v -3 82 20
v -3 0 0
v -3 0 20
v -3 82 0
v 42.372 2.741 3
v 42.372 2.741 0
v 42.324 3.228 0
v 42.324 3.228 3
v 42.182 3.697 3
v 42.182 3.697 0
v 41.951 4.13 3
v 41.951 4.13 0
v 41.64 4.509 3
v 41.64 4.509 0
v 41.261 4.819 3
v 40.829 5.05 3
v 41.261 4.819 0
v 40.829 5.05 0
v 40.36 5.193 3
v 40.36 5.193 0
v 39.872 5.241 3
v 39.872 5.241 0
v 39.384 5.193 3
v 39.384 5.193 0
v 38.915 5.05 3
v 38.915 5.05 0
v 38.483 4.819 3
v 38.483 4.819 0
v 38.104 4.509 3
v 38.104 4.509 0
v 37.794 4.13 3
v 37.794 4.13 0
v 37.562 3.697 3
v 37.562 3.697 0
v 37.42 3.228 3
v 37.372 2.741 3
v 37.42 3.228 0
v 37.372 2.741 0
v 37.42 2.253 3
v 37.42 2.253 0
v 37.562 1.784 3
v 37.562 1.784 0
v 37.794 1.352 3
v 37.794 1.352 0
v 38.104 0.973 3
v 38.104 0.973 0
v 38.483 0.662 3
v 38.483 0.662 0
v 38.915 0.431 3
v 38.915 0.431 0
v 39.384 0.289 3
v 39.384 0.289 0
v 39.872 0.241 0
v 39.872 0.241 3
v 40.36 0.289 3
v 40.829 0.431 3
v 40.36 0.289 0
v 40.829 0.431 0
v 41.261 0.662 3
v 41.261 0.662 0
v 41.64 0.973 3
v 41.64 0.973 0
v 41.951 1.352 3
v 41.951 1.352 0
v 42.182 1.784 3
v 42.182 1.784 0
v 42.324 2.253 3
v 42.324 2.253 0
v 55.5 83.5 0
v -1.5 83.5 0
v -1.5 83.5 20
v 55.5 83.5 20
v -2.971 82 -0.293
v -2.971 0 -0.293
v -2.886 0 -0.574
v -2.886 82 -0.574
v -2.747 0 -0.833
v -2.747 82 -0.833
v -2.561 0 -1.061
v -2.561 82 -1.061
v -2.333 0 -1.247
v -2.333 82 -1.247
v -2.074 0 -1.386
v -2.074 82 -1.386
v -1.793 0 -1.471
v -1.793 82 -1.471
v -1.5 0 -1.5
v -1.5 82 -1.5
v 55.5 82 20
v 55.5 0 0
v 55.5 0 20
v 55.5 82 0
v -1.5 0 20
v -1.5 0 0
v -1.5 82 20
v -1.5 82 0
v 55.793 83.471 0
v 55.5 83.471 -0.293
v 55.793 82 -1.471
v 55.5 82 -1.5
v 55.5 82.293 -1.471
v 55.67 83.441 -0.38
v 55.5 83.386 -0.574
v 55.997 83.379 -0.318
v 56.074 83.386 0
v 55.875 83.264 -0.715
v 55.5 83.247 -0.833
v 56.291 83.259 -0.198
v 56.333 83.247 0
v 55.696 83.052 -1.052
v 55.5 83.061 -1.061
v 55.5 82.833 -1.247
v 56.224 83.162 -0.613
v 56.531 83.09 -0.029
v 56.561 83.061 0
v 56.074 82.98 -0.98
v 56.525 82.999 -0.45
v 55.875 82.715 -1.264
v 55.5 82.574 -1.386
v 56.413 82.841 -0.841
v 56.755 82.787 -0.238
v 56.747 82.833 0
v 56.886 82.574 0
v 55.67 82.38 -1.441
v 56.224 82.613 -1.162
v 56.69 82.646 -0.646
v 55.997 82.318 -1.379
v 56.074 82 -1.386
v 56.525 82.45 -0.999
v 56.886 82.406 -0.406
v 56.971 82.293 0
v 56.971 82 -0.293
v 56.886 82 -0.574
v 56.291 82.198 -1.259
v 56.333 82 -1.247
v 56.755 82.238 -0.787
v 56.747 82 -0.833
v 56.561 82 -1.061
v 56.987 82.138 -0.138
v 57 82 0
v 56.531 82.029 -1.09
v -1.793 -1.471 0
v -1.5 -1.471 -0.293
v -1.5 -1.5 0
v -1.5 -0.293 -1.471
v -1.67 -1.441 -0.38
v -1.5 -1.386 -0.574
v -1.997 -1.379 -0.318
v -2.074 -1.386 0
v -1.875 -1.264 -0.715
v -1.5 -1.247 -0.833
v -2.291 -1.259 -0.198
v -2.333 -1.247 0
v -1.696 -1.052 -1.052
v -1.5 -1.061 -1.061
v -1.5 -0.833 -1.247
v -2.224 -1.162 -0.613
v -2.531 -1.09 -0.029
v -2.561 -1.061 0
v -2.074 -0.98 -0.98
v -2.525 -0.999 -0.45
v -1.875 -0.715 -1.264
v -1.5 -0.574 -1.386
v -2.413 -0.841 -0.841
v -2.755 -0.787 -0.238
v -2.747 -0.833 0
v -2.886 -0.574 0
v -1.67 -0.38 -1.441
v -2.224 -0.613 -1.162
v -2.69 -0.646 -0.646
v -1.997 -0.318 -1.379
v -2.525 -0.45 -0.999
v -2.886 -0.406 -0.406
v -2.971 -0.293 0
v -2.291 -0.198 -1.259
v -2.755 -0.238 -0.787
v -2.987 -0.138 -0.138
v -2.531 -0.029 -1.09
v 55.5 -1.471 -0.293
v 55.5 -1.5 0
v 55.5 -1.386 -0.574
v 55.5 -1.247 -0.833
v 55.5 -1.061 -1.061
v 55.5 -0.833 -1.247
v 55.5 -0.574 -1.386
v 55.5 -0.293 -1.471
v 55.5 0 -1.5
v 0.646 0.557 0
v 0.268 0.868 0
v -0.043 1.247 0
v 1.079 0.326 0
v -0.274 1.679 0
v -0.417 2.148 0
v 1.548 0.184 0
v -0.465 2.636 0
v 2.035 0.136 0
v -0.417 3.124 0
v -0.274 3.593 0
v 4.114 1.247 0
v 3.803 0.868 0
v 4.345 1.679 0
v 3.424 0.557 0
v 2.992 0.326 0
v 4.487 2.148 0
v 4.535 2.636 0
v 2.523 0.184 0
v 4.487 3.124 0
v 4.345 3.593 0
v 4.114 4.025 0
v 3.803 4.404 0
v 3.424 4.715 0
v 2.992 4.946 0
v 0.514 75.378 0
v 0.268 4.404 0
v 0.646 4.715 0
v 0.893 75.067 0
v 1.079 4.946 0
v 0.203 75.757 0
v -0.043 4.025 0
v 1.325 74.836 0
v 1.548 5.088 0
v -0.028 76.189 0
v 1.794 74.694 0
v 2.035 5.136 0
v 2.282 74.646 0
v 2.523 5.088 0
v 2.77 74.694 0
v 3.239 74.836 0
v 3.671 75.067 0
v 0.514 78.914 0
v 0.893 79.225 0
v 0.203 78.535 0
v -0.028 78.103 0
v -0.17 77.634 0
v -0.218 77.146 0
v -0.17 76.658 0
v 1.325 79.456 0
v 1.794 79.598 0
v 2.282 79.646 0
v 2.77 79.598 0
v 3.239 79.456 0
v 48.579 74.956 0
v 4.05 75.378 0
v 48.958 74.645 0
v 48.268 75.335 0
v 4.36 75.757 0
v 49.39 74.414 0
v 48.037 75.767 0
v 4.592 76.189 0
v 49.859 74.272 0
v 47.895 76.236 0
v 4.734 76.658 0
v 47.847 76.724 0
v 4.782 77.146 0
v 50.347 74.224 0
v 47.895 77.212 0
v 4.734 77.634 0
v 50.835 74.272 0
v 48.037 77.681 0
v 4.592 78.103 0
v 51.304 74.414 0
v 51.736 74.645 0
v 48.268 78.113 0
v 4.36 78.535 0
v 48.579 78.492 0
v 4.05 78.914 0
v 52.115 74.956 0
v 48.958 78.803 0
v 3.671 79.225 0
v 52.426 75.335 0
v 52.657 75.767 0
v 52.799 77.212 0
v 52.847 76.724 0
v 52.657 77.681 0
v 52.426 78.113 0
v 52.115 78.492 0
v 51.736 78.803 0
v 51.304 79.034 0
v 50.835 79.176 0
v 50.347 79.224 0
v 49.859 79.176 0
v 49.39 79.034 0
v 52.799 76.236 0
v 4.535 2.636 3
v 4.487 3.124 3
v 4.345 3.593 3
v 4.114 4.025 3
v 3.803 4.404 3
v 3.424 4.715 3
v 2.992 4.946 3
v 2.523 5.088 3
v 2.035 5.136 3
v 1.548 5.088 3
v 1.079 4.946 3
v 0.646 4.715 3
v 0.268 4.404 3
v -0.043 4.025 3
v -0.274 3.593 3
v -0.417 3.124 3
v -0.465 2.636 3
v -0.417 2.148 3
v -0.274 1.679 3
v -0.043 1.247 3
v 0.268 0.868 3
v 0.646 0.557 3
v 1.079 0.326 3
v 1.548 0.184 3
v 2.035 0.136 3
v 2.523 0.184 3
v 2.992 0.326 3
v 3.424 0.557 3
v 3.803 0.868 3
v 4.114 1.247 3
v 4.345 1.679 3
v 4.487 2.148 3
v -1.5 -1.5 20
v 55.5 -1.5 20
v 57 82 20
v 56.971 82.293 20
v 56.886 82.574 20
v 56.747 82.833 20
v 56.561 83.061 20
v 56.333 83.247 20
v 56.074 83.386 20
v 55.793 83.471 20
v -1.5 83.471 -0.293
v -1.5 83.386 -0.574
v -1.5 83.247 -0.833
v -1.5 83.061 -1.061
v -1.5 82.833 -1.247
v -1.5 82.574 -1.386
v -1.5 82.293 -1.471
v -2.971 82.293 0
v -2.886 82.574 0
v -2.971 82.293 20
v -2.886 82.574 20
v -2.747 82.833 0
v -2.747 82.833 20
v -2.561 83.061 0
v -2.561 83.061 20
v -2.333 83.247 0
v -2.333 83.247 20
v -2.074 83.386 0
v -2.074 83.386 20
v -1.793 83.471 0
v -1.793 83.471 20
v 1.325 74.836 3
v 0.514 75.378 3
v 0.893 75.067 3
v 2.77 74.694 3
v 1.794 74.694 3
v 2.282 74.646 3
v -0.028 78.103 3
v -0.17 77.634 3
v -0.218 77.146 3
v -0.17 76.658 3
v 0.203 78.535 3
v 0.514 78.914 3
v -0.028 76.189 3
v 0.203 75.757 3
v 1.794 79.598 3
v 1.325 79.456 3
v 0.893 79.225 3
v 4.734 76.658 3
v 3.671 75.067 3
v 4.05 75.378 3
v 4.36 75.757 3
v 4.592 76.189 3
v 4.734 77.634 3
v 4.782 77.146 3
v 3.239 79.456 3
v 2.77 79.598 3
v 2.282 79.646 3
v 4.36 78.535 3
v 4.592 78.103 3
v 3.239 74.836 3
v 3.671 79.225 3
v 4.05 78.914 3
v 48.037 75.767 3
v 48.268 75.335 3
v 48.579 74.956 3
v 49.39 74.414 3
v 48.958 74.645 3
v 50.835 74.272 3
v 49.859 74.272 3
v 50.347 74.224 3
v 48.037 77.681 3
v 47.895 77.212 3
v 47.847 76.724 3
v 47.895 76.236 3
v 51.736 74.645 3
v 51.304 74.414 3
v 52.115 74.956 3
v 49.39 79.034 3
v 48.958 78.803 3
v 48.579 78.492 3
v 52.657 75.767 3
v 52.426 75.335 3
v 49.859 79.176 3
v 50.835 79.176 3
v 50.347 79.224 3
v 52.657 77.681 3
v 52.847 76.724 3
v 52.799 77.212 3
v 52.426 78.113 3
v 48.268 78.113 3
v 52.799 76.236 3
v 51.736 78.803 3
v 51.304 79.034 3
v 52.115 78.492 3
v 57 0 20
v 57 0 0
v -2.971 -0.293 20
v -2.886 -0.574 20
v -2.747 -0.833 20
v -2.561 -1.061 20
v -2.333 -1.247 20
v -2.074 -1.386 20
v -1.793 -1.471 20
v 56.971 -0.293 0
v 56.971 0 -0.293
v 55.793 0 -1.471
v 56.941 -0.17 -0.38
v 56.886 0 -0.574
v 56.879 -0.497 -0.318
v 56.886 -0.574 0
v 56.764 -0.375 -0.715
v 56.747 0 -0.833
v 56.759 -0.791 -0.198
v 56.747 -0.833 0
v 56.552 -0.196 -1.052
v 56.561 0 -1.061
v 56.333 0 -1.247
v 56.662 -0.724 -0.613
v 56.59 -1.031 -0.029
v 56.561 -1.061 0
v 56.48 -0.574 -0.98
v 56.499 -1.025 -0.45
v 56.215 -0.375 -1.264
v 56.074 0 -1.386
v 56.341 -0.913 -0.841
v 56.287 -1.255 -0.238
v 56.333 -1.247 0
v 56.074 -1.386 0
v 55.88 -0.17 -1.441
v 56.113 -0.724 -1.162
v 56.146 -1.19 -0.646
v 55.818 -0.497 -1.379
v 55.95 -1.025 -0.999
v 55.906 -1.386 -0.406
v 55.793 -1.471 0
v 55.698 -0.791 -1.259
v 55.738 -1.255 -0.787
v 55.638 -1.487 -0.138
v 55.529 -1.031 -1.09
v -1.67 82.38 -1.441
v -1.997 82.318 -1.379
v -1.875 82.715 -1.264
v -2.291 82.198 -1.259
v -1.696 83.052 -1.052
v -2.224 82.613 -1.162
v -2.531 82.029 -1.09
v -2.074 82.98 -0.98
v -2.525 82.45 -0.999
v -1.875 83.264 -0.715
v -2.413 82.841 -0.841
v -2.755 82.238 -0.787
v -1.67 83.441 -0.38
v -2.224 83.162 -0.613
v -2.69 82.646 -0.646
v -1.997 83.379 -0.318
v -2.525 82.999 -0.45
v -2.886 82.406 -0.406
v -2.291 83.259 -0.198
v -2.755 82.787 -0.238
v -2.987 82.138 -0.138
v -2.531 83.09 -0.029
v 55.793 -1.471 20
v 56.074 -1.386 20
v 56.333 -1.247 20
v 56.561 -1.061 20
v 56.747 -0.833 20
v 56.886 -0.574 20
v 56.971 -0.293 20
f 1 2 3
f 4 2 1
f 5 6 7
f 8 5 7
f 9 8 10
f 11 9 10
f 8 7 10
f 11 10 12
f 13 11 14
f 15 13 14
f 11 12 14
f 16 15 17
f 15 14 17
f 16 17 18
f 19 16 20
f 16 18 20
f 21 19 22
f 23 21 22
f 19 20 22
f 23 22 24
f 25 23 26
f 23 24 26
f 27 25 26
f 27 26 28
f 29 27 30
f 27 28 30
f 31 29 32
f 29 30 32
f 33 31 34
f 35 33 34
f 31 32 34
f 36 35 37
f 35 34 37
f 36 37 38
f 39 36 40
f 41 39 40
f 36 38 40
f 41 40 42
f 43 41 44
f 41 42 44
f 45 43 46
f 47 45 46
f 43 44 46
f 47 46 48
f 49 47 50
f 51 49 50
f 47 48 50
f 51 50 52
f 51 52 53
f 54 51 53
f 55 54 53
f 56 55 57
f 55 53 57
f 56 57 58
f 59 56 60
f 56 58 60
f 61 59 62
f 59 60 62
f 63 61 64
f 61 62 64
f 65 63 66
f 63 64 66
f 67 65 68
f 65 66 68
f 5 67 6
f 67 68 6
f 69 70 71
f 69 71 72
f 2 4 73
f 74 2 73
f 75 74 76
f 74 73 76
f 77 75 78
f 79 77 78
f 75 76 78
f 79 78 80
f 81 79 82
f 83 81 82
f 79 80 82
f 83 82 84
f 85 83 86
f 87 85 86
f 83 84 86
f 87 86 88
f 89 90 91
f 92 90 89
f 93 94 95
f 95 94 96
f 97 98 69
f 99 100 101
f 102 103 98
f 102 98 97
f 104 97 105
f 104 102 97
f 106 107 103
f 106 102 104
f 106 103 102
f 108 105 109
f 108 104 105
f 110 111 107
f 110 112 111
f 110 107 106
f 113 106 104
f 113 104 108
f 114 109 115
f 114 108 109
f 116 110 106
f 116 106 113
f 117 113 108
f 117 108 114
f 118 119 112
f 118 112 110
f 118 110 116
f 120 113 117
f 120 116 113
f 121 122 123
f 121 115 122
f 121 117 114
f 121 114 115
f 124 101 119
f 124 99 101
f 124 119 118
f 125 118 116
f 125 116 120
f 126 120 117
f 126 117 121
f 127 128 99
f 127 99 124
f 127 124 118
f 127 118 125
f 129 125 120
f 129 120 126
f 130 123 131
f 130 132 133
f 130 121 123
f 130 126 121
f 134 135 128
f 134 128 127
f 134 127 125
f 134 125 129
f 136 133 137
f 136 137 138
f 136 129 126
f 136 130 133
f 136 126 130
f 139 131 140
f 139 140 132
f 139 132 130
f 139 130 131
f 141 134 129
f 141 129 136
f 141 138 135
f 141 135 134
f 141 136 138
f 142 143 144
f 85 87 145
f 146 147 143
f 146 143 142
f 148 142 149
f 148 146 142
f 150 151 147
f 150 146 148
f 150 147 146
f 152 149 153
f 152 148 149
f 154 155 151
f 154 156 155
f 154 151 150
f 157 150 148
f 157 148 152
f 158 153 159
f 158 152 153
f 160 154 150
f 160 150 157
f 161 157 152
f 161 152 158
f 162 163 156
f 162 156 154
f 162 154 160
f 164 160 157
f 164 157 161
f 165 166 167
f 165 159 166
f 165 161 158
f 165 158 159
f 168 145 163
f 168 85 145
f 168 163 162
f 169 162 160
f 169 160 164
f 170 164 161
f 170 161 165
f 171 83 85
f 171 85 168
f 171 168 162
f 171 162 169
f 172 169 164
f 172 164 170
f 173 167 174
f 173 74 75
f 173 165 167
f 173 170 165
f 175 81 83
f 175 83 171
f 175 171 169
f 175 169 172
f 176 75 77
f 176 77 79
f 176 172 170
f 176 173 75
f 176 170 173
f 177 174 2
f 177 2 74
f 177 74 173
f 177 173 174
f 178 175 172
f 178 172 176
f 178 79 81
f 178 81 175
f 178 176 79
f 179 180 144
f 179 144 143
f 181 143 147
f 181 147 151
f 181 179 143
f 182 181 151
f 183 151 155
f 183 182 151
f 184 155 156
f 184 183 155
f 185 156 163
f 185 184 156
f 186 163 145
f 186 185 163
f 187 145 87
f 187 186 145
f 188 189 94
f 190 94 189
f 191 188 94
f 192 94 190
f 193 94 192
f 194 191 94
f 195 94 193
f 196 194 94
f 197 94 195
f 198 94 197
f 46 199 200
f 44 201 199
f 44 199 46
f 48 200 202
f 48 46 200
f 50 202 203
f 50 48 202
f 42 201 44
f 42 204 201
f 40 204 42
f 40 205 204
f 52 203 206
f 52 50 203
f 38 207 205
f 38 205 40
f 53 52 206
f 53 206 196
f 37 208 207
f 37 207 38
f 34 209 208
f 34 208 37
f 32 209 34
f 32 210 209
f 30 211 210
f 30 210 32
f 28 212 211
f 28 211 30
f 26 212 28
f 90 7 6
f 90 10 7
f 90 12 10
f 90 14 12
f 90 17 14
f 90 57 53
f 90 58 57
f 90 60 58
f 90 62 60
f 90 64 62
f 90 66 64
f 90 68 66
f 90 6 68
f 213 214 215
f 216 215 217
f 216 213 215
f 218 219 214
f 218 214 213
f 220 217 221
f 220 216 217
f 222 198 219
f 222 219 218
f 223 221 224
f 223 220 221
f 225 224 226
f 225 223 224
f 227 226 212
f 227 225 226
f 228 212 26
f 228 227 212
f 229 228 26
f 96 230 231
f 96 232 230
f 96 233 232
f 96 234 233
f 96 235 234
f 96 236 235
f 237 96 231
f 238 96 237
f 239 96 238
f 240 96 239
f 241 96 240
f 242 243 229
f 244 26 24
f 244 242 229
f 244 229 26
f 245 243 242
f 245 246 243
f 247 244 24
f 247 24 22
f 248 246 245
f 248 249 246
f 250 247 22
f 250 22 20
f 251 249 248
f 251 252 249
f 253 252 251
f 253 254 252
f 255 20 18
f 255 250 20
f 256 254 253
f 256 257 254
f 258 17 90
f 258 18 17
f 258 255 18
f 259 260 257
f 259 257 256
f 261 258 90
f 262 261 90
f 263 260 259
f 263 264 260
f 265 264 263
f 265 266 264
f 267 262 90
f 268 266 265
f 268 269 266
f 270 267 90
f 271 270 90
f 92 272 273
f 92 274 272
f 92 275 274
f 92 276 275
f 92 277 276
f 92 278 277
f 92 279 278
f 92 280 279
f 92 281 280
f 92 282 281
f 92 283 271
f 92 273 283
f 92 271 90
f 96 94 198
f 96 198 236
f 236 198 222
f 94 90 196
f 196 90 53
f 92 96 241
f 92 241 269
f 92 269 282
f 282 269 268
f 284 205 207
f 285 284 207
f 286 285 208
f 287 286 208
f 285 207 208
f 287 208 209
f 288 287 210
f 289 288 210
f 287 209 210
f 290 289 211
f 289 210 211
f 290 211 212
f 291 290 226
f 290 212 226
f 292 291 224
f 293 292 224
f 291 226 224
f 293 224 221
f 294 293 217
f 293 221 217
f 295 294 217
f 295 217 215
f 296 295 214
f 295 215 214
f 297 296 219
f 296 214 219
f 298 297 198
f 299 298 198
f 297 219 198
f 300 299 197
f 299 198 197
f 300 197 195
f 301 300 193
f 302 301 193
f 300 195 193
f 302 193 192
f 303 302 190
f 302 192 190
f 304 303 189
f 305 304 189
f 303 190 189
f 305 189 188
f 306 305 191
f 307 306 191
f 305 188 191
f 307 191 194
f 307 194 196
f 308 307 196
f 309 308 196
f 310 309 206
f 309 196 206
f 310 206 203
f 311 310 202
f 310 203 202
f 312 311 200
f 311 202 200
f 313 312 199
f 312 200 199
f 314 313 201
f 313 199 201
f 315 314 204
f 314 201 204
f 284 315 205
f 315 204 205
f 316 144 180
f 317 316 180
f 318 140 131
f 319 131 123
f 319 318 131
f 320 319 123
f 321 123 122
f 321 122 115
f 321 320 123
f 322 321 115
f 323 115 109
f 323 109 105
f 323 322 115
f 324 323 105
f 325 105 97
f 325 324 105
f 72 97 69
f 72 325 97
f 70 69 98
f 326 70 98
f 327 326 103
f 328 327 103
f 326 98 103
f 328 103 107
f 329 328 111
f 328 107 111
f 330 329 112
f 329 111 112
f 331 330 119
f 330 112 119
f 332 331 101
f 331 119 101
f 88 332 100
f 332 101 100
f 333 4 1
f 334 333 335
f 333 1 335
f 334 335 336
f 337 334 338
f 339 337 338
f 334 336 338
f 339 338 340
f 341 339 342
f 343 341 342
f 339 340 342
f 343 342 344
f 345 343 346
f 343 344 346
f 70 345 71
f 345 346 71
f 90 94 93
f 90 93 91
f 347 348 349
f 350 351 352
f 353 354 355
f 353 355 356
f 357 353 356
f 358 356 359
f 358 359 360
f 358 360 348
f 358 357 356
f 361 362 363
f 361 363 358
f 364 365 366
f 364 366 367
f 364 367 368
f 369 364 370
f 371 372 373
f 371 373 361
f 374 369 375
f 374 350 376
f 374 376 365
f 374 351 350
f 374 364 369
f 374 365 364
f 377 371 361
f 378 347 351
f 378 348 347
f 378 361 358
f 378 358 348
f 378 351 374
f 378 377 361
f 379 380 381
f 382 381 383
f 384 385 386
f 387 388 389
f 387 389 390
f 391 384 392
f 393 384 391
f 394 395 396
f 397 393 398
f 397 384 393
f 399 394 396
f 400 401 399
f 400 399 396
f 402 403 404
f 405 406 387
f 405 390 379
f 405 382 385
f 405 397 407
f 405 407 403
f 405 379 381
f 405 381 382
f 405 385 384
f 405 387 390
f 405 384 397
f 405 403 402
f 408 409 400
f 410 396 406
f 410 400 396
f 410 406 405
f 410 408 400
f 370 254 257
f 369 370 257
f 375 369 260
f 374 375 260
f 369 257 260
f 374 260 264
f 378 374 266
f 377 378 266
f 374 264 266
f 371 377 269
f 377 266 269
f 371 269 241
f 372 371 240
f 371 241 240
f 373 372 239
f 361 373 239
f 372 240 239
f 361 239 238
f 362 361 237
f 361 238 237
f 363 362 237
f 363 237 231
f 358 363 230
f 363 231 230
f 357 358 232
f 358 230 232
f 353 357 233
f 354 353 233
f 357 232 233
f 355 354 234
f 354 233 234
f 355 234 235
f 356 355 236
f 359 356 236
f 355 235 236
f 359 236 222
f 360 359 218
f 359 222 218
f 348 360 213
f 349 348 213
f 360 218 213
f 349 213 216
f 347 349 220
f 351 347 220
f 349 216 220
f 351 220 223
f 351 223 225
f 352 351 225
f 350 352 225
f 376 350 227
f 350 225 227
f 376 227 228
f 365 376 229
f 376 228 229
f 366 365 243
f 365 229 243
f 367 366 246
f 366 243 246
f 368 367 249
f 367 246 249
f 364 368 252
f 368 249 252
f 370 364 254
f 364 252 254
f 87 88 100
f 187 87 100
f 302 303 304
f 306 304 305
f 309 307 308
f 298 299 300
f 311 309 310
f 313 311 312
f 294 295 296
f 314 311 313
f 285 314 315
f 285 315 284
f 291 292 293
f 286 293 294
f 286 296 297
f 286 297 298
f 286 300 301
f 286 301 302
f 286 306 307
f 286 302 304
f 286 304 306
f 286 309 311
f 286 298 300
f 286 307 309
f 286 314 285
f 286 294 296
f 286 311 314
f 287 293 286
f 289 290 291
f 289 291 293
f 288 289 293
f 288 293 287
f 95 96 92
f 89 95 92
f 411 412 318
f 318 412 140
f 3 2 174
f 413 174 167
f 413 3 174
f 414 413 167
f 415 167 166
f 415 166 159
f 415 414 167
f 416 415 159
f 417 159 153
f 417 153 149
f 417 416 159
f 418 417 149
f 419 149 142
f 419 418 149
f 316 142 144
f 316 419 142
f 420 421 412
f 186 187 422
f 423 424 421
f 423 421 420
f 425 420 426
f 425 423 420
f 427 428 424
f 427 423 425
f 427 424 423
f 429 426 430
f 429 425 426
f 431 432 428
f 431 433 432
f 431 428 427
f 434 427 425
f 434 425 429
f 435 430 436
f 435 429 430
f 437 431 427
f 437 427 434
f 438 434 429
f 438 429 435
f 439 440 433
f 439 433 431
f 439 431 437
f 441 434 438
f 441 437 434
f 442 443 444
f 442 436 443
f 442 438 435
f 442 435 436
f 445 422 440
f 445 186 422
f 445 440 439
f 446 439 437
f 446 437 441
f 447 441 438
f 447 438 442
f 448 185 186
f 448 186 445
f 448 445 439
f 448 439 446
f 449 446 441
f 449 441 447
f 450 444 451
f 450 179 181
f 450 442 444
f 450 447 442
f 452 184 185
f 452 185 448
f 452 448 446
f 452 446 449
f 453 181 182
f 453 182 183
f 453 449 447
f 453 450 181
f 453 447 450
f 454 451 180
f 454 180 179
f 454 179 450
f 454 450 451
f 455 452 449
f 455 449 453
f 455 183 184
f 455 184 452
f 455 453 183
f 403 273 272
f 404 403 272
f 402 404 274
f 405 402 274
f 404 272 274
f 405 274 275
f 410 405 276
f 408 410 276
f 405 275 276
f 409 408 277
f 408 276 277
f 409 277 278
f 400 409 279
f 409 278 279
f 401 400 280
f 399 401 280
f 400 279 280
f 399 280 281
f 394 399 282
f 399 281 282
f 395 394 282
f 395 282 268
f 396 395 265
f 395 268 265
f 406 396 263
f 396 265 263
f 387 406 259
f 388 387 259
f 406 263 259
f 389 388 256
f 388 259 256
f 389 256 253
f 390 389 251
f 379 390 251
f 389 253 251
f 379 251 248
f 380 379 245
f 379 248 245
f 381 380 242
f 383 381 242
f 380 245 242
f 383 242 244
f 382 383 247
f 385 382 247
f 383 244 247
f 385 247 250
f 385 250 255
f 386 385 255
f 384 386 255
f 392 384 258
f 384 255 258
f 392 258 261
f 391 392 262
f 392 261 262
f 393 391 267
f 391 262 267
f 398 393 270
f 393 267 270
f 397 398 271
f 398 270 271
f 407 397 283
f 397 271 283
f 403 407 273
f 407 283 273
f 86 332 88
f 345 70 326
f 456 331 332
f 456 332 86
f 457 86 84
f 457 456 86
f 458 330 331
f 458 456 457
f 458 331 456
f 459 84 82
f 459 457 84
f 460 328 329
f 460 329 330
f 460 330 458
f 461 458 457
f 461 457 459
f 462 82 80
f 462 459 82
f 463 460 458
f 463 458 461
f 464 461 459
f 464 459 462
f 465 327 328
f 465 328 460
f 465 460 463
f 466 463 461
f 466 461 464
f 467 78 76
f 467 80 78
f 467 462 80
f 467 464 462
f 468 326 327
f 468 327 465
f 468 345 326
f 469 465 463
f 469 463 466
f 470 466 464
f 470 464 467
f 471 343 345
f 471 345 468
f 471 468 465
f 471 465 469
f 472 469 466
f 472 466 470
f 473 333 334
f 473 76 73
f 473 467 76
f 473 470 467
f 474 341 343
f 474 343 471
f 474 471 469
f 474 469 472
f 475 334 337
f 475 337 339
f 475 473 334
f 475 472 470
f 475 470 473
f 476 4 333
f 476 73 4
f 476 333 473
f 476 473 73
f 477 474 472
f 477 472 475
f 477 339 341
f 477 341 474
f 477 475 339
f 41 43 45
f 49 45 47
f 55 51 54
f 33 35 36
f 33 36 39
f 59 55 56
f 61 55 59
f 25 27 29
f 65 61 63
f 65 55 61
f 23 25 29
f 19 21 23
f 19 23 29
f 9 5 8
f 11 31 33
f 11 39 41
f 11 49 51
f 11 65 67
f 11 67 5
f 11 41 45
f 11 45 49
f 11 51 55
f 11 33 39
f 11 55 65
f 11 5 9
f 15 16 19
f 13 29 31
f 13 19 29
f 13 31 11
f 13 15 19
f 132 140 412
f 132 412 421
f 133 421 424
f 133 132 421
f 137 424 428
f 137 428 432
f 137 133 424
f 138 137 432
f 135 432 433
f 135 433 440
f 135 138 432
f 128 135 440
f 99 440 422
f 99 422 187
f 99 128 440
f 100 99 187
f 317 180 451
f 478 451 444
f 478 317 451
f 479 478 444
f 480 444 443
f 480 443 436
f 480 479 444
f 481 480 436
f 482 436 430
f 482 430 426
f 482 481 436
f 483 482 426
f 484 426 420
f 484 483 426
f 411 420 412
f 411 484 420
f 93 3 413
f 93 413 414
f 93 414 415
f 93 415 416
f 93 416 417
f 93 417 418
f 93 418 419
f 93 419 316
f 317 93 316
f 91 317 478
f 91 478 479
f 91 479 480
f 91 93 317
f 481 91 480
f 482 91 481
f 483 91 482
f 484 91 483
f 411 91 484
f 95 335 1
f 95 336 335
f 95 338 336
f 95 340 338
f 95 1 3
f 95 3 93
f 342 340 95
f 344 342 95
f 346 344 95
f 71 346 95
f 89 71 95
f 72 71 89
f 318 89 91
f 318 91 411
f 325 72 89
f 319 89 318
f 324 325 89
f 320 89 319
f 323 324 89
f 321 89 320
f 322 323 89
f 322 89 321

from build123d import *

# Parameters (mm, degrees)
BOX_W        = 57
BOX_H        = 82
BOX_DEPTH    = 20
THICKNESS_T  = 1.5
SKETCH003_R  = 2.5
PAD001_DEPTH = 3


with BuildPart() as part:
    # Box → Box (new body)
    with BuildSketch(Plane.XY):
        with Locations((28.5, 41)):
            Rectangle(BOX_W, BOX_H)
    extrude(amount=BOX_DEPTH)

    # Thickness
    thickness_openings = [part.faces().sort_by_distance(p)[0] for p in [
        (28.5, 41, 20),
    ]]
    offset(amount=THICKNESS_T, openings=thickness_openings)


with BuildPart() as part_1:
    # Thickness placement: moved
    add(part.part.moved(Location((-1.5, 0, 0))))

    # Sketch003 → Pad001 (new body)
    with BuildSketch(Plane(origin=(-1.5, 0, 0), x_dir=(1, 0, 0), z_dir=(0, 0, 1))):
        with Locations((3.53528, 2.636141)):
            Circle(SKETCH003_R)
        with Locations((41.372181, 2.740742)):
            Circle(SKETCH003_R)
        with Locations((3.781813, 77.146011)):
            Circle(SKETCH003_R)
        with Locations((51.846909, 76.723869)):
            Circle(SKETCH003_R)
    extrude(amount=PAD001_DEPTH)


solid = part_1.part
